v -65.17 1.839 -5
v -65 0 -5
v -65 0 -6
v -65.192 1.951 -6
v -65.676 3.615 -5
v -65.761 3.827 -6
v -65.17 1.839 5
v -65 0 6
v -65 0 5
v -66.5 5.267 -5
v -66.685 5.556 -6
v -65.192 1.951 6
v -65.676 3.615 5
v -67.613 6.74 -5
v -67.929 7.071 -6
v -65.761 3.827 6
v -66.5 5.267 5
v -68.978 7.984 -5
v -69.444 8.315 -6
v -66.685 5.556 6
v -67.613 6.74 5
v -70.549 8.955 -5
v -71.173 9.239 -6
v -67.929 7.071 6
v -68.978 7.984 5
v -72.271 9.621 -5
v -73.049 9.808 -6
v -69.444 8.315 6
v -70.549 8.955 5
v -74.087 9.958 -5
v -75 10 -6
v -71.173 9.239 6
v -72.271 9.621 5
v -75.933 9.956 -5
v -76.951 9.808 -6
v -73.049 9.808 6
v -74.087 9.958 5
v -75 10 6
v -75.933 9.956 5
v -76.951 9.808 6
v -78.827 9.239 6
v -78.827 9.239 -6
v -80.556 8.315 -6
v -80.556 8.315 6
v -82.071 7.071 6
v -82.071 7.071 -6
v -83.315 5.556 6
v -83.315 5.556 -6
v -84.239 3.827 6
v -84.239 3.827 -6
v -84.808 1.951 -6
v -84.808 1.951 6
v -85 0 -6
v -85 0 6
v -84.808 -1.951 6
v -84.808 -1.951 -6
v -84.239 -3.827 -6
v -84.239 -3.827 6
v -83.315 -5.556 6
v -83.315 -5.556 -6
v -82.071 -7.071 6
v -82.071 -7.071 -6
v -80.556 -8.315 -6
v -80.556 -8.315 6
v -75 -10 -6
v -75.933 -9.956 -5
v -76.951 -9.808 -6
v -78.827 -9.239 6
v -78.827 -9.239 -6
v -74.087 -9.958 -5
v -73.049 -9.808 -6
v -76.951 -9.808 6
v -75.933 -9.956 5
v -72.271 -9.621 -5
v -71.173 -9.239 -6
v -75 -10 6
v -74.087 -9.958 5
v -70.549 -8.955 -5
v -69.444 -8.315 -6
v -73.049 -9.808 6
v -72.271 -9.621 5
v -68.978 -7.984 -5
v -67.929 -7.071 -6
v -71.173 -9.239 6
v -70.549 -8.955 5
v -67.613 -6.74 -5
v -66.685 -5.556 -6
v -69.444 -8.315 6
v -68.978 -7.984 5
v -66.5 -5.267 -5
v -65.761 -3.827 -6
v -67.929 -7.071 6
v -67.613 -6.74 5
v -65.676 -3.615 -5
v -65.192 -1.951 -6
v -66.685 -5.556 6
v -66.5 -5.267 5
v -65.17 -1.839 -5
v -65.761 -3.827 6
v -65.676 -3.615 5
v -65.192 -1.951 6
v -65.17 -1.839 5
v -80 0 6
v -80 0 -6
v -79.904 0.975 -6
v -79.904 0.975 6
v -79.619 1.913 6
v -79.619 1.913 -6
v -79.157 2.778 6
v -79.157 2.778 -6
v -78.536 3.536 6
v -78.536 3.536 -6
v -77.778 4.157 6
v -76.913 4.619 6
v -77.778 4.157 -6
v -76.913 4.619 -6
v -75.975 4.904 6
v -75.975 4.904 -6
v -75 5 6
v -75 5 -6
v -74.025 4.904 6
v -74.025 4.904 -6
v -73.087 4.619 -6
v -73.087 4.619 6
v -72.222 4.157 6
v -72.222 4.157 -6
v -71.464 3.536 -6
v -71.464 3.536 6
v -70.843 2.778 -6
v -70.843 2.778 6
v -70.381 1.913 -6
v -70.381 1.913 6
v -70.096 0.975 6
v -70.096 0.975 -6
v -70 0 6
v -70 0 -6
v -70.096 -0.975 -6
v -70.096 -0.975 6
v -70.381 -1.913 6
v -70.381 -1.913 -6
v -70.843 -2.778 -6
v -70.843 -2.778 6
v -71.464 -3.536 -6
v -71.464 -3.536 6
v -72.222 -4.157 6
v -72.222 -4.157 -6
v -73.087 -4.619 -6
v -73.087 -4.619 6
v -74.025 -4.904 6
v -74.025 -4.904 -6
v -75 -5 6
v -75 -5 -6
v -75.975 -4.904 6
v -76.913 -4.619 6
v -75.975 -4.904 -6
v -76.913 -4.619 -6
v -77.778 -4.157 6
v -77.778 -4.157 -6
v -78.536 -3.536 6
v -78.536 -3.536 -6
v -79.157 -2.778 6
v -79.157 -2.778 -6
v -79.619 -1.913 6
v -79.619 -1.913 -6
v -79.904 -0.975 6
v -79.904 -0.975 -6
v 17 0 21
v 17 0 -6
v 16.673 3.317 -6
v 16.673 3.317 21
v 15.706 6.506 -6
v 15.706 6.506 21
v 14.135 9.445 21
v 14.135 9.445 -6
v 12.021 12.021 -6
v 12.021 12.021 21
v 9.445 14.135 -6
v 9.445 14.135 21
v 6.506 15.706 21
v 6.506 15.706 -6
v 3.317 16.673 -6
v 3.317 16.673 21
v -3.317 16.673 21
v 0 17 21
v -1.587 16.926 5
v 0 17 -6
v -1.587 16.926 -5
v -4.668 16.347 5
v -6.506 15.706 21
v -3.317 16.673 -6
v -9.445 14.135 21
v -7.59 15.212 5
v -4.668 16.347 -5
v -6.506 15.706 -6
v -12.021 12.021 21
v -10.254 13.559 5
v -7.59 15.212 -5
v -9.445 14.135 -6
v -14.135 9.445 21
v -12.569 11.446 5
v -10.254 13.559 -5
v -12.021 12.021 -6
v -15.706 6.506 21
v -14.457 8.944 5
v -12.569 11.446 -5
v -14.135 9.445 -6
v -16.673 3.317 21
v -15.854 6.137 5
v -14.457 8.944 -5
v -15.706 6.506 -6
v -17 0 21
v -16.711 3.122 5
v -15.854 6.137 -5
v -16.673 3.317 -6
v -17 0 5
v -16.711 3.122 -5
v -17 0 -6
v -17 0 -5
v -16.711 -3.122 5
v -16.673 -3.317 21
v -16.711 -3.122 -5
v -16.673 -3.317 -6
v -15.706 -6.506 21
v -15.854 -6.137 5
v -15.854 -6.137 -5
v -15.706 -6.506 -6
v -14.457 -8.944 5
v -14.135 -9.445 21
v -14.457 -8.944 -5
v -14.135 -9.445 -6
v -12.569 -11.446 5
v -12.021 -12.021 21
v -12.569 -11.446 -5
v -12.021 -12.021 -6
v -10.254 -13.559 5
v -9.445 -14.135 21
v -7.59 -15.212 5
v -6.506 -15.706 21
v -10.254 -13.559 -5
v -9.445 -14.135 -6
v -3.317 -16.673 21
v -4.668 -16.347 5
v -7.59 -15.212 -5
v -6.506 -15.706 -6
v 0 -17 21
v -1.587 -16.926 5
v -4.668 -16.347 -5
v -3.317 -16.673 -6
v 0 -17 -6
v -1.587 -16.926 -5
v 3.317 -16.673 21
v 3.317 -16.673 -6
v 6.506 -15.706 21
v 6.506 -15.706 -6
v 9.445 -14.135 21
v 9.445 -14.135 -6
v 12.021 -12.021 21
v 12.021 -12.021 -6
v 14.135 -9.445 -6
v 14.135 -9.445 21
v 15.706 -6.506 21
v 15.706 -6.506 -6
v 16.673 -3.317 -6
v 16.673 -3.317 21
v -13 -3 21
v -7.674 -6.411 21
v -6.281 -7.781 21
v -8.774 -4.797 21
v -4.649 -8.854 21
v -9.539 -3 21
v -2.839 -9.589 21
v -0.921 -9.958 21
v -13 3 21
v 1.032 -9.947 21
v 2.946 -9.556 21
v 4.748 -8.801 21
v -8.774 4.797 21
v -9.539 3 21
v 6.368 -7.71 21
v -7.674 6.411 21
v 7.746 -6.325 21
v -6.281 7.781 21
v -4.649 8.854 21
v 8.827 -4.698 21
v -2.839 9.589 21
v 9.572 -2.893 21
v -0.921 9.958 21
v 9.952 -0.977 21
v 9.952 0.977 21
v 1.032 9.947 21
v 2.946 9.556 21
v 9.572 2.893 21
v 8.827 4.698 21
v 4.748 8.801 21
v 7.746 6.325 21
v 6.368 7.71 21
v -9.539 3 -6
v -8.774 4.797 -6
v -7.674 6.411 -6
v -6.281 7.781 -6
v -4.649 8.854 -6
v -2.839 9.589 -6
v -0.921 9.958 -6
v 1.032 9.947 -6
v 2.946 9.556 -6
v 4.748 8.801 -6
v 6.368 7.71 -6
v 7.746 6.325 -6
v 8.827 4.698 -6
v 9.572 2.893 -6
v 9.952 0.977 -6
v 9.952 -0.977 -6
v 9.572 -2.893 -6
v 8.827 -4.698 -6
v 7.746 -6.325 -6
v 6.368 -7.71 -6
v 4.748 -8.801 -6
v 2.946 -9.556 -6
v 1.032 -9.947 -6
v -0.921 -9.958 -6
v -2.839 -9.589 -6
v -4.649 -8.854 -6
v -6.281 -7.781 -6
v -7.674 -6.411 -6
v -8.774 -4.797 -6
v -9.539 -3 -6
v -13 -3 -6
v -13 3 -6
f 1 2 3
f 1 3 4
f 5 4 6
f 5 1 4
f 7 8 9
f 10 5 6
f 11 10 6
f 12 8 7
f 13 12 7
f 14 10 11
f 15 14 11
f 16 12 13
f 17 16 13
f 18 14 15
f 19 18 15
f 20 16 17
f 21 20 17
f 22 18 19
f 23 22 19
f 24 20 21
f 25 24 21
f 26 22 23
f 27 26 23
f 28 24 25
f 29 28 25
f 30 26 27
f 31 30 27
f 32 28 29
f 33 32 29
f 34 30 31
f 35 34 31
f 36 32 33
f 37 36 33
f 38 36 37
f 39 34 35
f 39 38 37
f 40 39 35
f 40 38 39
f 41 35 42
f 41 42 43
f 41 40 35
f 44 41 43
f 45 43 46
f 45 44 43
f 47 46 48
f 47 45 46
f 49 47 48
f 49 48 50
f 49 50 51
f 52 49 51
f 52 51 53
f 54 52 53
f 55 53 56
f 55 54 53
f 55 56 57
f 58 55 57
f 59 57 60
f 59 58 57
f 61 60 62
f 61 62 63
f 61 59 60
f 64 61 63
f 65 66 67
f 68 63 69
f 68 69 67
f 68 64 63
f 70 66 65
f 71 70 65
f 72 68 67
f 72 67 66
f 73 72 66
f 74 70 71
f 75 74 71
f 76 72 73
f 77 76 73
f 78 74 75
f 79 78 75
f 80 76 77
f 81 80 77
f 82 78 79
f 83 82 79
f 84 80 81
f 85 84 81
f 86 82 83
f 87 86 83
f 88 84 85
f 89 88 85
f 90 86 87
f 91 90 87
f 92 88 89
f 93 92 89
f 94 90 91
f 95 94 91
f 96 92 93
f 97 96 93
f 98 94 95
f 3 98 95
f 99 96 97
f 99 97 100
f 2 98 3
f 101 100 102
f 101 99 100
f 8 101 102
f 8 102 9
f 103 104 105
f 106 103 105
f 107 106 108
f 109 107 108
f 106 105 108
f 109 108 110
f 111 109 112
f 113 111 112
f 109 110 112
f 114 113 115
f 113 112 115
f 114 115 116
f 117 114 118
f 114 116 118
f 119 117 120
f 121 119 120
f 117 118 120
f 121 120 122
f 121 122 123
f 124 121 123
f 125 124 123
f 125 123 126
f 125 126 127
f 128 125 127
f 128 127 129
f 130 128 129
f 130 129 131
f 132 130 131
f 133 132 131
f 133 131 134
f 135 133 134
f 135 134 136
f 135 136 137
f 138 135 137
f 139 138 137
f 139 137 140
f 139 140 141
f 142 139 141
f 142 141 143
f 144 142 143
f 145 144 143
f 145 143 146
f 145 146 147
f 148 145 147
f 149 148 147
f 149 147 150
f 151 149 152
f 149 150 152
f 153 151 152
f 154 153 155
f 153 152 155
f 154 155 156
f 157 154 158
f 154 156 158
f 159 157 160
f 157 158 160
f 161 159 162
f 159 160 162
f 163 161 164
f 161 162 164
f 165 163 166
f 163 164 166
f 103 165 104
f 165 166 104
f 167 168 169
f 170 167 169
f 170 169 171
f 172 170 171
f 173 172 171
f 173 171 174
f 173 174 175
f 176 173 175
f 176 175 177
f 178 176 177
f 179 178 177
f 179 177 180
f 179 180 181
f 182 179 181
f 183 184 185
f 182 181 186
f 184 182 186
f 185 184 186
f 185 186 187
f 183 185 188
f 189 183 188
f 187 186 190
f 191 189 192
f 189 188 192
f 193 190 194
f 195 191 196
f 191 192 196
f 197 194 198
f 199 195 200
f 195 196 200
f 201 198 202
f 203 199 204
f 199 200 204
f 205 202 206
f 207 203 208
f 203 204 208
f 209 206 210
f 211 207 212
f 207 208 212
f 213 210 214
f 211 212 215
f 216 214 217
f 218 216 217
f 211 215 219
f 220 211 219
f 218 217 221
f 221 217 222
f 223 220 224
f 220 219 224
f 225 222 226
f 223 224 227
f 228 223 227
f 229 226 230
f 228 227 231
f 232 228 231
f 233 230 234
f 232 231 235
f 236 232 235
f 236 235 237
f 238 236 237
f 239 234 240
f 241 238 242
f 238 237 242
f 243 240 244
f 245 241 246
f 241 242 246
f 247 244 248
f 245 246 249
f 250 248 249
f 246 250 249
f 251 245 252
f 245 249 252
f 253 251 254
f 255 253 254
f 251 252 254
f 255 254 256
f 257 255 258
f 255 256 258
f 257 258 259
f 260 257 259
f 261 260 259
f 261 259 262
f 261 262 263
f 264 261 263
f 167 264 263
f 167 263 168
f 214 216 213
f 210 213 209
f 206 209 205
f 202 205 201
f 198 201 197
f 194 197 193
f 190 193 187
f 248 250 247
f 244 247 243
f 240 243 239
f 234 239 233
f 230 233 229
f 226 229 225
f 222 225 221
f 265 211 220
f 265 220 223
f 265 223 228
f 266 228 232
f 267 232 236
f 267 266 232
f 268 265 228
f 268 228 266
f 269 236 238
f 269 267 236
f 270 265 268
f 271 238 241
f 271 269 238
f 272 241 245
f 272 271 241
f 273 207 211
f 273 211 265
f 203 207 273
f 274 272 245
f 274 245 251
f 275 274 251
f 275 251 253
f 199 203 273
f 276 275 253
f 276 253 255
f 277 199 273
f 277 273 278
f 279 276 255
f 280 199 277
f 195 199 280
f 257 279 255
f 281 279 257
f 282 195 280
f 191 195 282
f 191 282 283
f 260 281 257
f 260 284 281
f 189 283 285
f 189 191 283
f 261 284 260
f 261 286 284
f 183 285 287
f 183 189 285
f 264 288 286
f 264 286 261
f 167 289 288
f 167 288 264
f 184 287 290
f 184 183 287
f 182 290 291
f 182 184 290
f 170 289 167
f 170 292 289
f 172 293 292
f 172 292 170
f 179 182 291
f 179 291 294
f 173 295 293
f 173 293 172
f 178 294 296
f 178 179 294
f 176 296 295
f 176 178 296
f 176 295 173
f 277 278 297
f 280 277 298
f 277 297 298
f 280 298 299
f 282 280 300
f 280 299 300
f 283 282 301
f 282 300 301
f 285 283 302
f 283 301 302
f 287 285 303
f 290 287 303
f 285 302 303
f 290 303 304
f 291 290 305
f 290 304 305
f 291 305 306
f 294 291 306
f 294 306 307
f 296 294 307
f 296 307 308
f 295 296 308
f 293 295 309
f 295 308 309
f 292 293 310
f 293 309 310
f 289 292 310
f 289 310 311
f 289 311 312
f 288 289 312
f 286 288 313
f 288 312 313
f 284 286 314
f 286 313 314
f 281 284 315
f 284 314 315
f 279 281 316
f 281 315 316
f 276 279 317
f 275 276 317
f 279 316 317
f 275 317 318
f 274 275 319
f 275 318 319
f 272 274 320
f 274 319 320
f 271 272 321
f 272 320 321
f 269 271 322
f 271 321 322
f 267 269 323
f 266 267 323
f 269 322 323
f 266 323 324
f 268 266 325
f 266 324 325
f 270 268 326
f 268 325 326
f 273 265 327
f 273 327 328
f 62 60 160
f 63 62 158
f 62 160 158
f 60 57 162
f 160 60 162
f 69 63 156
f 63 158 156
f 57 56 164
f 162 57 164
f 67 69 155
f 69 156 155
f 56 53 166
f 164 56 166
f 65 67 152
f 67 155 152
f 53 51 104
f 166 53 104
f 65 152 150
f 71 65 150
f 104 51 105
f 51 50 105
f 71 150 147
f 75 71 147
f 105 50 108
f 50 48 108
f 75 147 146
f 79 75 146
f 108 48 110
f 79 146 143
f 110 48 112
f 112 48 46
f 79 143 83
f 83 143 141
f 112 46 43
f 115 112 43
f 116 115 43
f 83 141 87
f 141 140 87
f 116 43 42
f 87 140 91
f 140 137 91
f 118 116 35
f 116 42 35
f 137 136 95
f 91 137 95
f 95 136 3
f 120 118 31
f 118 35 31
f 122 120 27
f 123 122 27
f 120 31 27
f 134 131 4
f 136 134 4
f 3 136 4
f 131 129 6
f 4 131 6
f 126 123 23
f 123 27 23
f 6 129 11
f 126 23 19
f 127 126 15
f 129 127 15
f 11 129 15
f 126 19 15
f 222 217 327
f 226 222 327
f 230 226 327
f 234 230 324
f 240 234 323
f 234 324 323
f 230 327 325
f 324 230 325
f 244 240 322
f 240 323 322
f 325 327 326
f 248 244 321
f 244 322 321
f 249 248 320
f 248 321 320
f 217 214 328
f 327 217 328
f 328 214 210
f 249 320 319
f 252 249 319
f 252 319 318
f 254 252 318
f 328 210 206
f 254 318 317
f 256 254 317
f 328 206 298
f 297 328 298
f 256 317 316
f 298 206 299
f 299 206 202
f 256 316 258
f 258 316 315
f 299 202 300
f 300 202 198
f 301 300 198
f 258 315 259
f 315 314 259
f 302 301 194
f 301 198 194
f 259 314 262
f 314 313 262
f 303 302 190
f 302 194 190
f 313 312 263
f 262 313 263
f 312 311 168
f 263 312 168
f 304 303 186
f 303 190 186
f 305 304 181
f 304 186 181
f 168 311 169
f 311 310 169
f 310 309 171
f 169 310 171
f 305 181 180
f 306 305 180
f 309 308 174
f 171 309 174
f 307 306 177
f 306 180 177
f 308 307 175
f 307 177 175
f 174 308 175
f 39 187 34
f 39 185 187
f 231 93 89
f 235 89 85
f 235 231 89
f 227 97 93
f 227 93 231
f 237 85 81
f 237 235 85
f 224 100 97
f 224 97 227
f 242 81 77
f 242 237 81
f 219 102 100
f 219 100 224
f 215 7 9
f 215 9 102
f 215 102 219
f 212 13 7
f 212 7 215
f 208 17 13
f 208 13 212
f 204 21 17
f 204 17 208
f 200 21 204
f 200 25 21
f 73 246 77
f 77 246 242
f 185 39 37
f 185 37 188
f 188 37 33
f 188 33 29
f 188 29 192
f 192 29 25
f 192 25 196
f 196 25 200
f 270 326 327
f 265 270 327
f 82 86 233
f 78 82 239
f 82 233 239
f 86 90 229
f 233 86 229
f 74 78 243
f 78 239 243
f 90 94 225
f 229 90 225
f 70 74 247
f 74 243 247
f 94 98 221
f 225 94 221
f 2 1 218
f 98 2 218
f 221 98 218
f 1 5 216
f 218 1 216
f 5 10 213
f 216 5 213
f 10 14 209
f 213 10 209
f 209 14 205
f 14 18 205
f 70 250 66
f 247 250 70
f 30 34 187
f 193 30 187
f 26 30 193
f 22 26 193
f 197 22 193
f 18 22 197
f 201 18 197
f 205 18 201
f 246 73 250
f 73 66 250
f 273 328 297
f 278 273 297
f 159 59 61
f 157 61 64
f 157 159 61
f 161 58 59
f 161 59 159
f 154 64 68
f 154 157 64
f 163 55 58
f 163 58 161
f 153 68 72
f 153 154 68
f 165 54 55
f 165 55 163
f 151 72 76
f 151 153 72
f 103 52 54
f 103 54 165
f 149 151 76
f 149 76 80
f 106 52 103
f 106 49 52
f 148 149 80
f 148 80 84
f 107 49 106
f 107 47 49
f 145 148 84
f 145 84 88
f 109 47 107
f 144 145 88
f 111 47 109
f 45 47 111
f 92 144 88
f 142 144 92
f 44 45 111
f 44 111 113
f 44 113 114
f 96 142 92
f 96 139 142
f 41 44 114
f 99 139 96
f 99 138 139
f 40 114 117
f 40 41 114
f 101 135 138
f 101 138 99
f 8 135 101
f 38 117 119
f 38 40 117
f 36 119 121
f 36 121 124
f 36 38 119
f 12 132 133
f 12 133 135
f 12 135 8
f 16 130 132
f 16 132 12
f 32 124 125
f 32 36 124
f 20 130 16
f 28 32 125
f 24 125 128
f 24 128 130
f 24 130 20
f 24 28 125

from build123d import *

# Parameters (mm, degrees)
ESTRUSIONE_ESTRUSIONE1_DEPTH      = 6
ESTRUSIONE_ESTRUSIONE2_DEPTH      = 21
ESTRUSIONE_ESTRUSIONE2_DEPTH_BACK = 6
ESTRUSIONE_ESTRUSIONE3_DEPTH      = 5
FORO_10_0_10_1_D                  = 10


with BuildPart() as part:
    # Schizzo2 → Estrusione-Estrusione1 (new, symmetric)
    with BuildSketch(Plane.XY):
        with BuildLine():
            ThreePointArc((-65, 0), (-68.266996708, 7.393691004), (-75.933333333, 9.956349175))
            ThreePointArc((-75.933333333, 9.956349175), (-85, 0), (-75.933333333, -9.956349175))
            ThreePointArc((-75.933333333, -9.956349175), (-68.266996708, -7.393691004), (-65, 0))
        make_face()
    extrude(amount=ESTRUSIONE_ESTRUSIONE1_DEPTH, both=True)



with BuildPart() as body_2:
    # Schizzo2<3> → Estrusione-Estrusione2 (new, two sides: drawn at the far end of the back side and taken through both)
    with BuildSketch(Plane.XY.offset(-ESTRUSIONE_ESTRUSIONE2_DEPTH_BACK)):
        with BuildLine():
            ThreePointArc((17, 0), (11.446105597, 12.569274707), (-1.586666667, 16.925793597))
            ThreePointArc((-1.586666667, 16.925793597), (-17, 0), (-1.586666667, -16.925793597))
            ThreePointArc((-1.586666667, -16.925793597), (11.446105597, -12.569274707), (17, 0))
        make_face()
        with BuildLine():
            Line((-13, -3), (-13, 3))
            Line((-13, 3), (-9.539392014, 3))
            ThreePointArc((-9.539392014, 3), (10, 0), (-9.539392014, -3))
            Line((-9.539392014, -3), (-13, -3))
        make_face(mode=Mode.SUBTRACT)
    extrude(amount=ESTRUSIONE_ESTRUSIONE2_DEPTH + ESTRUSIONE_ESTRUSIONE2_DEPTH_BACK)


with BuildPart() as part_1:
    add(part.part)

    add(body_2.part)  # Estrusione-Estrusione3 merges body 2
    # Schizzo2<4> → Estrusione-Estrusione3 (add, symmetric)
    with BuildSketch(Plane.XY):
        with BuildLine():
            ThreePointArc((-75.933333333, 9.956349175), (-65, 0), (-75.933333333, -9.956349175))
            Line((-75.933333333, -9.956349175), (-1.586666667, -16.925793597))
            ThreePointArc((-1.586666667, -16.925793597), (-17, 0), (-1.586666667, 16.925793597))
            Line((-1.586666667, 16.925793597), (-75.933333333, 9.956349175))
        make_face()
    extrude(amount=ESTRUSIONE_ESTRUSIONE3_DEPTH, both=True)

    # Foro Ø10.0 (10)-1 (through all)
    with Locations(Plane.XY.offset(6)):
        with Locations((-75, 0)):
            Hole(FORO_10_0_10_1_D / 2)


solid = part_1.part
